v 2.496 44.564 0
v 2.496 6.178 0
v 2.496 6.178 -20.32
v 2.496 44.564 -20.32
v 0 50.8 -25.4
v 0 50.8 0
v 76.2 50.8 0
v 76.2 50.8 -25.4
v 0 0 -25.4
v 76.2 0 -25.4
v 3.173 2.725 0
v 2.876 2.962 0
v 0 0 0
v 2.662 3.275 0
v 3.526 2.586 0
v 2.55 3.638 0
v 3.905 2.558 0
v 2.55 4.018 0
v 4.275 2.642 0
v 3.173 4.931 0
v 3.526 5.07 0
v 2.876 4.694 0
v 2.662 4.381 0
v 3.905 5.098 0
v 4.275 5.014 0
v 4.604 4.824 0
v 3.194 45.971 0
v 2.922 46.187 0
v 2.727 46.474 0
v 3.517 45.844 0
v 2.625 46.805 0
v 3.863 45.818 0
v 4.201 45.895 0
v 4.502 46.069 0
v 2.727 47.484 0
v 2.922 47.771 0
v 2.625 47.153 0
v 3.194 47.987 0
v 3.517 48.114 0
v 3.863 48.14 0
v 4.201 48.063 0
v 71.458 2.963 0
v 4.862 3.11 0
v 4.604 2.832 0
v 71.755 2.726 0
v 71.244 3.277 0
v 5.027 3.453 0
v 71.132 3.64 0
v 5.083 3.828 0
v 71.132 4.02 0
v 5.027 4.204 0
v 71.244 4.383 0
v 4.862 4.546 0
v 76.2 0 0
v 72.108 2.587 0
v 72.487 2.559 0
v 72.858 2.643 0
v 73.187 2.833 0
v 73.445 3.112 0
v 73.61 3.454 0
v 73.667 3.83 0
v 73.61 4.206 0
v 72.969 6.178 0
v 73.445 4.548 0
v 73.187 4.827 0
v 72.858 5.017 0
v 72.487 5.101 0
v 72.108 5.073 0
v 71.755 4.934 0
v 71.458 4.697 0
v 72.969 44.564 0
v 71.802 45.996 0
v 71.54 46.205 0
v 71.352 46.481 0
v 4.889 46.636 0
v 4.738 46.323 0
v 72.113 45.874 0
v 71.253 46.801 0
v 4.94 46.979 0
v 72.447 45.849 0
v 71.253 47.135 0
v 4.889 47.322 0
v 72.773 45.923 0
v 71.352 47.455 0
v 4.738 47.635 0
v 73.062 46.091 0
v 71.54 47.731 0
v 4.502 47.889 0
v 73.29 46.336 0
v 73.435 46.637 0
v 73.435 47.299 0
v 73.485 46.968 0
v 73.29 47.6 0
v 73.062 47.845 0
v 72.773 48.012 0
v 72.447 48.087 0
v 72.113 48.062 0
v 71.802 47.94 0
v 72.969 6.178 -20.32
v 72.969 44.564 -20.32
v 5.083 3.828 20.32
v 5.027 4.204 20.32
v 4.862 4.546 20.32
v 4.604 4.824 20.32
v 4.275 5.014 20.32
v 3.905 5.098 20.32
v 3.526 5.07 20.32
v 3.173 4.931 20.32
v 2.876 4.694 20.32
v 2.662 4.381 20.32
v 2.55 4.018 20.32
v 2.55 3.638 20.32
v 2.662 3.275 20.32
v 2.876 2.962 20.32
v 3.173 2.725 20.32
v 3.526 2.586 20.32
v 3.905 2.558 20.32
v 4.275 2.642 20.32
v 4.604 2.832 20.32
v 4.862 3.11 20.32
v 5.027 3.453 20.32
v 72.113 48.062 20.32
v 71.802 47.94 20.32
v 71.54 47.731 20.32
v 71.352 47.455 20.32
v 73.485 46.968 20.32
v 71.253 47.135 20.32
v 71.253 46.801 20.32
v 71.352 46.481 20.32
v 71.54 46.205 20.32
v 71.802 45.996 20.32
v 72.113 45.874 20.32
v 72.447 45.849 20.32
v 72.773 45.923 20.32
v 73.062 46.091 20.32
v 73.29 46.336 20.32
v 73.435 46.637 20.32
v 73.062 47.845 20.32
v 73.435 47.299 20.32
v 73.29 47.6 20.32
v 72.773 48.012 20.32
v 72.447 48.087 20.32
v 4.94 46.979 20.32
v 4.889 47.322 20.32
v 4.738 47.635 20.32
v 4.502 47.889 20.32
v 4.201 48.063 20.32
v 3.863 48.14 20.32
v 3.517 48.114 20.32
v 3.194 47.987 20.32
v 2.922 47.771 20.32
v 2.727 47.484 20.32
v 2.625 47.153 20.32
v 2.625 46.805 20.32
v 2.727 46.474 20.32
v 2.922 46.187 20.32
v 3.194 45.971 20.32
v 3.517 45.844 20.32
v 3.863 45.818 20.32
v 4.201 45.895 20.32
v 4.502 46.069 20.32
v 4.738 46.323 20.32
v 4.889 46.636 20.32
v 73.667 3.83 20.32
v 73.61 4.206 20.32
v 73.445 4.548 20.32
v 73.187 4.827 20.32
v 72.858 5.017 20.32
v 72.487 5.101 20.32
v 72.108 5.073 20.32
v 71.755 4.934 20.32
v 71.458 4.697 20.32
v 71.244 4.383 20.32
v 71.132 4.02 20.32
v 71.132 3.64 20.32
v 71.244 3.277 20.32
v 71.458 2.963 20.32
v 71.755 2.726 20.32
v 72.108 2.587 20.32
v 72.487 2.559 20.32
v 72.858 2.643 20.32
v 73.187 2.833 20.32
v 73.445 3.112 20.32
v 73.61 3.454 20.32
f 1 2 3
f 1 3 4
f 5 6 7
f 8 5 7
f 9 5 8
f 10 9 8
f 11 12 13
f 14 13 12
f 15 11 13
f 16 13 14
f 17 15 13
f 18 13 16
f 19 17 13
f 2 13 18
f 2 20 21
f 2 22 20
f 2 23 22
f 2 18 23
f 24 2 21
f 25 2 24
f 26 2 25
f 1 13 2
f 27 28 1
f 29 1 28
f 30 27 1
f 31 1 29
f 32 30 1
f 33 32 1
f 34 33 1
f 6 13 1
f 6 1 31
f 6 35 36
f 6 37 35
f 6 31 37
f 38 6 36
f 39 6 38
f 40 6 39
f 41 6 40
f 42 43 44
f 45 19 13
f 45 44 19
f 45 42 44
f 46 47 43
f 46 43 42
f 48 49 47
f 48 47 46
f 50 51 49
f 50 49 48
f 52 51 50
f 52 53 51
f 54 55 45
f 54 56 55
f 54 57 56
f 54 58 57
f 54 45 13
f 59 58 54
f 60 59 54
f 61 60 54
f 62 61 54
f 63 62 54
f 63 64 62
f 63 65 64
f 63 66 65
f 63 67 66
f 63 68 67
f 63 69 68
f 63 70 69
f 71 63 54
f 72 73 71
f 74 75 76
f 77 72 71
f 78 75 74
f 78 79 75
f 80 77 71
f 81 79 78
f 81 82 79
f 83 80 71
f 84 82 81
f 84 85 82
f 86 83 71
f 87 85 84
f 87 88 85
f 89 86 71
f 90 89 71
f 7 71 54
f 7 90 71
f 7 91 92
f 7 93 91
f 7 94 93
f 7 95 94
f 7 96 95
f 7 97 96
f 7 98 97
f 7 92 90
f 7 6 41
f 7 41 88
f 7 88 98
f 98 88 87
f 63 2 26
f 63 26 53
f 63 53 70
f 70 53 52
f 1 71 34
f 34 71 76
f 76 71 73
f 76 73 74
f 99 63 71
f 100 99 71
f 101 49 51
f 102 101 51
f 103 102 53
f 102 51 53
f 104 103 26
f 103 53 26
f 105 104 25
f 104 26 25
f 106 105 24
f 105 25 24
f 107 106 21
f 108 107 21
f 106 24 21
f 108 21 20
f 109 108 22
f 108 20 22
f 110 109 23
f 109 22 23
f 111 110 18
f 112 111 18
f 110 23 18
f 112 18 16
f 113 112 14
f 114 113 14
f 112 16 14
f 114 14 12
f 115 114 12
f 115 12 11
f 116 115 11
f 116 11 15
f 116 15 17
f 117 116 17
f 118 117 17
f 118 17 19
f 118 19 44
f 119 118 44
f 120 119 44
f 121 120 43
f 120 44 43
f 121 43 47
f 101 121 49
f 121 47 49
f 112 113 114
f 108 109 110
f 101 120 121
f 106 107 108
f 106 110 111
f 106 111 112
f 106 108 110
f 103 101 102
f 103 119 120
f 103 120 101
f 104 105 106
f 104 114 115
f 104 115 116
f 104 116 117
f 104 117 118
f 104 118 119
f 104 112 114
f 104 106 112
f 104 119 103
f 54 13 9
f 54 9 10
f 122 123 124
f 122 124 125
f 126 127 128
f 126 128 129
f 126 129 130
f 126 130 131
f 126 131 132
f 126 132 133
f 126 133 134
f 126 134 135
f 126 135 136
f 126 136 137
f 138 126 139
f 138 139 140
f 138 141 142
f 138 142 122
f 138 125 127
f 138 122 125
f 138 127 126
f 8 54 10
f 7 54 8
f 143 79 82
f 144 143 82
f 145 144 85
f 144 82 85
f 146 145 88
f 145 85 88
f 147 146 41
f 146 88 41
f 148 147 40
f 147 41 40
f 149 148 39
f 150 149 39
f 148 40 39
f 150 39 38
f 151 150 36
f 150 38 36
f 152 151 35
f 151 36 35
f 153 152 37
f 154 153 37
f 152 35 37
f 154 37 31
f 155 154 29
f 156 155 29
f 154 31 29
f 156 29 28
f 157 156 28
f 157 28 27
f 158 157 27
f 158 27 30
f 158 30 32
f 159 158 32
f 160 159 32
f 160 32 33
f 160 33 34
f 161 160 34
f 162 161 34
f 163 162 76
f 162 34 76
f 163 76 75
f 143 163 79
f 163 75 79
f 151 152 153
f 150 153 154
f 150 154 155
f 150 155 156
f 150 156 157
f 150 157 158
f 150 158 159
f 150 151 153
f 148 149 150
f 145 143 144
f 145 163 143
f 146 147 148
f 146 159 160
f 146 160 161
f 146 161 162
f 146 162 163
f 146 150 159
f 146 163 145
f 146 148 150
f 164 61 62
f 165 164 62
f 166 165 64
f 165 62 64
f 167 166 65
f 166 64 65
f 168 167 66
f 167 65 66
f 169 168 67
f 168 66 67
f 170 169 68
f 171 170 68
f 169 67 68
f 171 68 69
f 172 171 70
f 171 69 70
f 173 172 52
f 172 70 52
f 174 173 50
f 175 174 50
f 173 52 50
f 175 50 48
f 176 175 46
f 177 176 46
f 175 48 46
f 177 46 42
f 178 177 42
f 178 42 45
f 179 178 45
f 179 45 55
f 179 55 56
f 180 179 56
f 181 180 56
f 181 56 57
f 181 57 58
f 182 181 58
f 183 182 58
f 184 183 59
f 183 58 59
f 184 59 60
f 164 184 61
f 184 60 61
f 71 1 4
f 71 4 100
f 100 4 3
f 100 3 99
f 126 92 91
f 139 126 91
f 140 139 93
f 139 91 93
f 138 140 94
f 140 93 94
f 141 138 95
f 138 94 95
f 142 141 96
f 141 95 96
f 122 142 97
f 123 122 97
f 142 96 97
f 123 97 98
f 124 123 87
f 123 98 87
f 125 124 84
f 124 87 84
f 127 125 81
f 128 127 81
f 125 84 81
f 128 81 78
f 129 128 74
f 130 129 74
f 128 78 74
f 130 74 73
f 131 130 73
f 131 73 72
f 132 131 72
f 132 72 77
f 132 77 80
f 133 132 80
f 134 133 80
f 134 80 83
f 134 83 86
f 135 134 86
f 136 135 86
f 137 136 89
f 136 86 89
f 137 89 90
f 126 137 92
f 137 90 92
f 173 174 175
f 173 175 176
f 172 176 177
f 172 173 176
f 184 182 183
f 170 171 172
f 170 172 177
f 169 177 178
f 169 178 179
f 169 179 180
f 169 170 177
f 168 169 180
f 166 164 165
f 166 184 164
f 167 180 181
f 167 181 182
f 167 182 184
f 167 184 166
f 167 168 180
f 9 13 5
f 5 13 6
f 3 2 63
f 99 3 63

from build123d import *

# Parameters (mm, degrees)
F0_W     = 76.2
F0_H     = 50.8
F1_DEPTH = 25.4
F2_W     = 70.472512
F2_H     = 38.386009
F3_DEPTH = 20.32
F4_R     = 1.164425
F4_R_2   = 1.122016
F4_R_3   = 1.274708
F4_R_4   = 1.273834
F5_DEPTH = 20.32


with BuildPart() as f1:
    # F0 (on Top) → F1 (new body)
    with BuildSketch(Plane.XY):
        with Locations((38.1, 25.4)):
            Rectangle(F0_W, F0_H)
    extrude(amount=-F1_DEPTH)

    # F2 (on Top) → F3 (cut)
    with BuildSketch(Plane.XY):
        with Locations((37.732361, 25.370613)):
            Rectangle(F2_W, F2_H)
    extrude(amount=-F3_DEPTH, mode=Mode.SUBTRACT)

    # F4 (on Top) → F5 (join)
    with BuildSketch(Plane.XY):
        with Locations((3.776019, 46.978962)):
            Circle(F4_R)
        with Locations((72.362818, 46.967924)):
            Circle(F4_R_2)
        with Locations((72.392121, 3.830065)):
            Circle(F4_R_3)
        with Locations((3.809462, 3.828035)):
            Circle(F4_R_4)
    extrude(amount=F5_DEPTH)


solid = f1.part
